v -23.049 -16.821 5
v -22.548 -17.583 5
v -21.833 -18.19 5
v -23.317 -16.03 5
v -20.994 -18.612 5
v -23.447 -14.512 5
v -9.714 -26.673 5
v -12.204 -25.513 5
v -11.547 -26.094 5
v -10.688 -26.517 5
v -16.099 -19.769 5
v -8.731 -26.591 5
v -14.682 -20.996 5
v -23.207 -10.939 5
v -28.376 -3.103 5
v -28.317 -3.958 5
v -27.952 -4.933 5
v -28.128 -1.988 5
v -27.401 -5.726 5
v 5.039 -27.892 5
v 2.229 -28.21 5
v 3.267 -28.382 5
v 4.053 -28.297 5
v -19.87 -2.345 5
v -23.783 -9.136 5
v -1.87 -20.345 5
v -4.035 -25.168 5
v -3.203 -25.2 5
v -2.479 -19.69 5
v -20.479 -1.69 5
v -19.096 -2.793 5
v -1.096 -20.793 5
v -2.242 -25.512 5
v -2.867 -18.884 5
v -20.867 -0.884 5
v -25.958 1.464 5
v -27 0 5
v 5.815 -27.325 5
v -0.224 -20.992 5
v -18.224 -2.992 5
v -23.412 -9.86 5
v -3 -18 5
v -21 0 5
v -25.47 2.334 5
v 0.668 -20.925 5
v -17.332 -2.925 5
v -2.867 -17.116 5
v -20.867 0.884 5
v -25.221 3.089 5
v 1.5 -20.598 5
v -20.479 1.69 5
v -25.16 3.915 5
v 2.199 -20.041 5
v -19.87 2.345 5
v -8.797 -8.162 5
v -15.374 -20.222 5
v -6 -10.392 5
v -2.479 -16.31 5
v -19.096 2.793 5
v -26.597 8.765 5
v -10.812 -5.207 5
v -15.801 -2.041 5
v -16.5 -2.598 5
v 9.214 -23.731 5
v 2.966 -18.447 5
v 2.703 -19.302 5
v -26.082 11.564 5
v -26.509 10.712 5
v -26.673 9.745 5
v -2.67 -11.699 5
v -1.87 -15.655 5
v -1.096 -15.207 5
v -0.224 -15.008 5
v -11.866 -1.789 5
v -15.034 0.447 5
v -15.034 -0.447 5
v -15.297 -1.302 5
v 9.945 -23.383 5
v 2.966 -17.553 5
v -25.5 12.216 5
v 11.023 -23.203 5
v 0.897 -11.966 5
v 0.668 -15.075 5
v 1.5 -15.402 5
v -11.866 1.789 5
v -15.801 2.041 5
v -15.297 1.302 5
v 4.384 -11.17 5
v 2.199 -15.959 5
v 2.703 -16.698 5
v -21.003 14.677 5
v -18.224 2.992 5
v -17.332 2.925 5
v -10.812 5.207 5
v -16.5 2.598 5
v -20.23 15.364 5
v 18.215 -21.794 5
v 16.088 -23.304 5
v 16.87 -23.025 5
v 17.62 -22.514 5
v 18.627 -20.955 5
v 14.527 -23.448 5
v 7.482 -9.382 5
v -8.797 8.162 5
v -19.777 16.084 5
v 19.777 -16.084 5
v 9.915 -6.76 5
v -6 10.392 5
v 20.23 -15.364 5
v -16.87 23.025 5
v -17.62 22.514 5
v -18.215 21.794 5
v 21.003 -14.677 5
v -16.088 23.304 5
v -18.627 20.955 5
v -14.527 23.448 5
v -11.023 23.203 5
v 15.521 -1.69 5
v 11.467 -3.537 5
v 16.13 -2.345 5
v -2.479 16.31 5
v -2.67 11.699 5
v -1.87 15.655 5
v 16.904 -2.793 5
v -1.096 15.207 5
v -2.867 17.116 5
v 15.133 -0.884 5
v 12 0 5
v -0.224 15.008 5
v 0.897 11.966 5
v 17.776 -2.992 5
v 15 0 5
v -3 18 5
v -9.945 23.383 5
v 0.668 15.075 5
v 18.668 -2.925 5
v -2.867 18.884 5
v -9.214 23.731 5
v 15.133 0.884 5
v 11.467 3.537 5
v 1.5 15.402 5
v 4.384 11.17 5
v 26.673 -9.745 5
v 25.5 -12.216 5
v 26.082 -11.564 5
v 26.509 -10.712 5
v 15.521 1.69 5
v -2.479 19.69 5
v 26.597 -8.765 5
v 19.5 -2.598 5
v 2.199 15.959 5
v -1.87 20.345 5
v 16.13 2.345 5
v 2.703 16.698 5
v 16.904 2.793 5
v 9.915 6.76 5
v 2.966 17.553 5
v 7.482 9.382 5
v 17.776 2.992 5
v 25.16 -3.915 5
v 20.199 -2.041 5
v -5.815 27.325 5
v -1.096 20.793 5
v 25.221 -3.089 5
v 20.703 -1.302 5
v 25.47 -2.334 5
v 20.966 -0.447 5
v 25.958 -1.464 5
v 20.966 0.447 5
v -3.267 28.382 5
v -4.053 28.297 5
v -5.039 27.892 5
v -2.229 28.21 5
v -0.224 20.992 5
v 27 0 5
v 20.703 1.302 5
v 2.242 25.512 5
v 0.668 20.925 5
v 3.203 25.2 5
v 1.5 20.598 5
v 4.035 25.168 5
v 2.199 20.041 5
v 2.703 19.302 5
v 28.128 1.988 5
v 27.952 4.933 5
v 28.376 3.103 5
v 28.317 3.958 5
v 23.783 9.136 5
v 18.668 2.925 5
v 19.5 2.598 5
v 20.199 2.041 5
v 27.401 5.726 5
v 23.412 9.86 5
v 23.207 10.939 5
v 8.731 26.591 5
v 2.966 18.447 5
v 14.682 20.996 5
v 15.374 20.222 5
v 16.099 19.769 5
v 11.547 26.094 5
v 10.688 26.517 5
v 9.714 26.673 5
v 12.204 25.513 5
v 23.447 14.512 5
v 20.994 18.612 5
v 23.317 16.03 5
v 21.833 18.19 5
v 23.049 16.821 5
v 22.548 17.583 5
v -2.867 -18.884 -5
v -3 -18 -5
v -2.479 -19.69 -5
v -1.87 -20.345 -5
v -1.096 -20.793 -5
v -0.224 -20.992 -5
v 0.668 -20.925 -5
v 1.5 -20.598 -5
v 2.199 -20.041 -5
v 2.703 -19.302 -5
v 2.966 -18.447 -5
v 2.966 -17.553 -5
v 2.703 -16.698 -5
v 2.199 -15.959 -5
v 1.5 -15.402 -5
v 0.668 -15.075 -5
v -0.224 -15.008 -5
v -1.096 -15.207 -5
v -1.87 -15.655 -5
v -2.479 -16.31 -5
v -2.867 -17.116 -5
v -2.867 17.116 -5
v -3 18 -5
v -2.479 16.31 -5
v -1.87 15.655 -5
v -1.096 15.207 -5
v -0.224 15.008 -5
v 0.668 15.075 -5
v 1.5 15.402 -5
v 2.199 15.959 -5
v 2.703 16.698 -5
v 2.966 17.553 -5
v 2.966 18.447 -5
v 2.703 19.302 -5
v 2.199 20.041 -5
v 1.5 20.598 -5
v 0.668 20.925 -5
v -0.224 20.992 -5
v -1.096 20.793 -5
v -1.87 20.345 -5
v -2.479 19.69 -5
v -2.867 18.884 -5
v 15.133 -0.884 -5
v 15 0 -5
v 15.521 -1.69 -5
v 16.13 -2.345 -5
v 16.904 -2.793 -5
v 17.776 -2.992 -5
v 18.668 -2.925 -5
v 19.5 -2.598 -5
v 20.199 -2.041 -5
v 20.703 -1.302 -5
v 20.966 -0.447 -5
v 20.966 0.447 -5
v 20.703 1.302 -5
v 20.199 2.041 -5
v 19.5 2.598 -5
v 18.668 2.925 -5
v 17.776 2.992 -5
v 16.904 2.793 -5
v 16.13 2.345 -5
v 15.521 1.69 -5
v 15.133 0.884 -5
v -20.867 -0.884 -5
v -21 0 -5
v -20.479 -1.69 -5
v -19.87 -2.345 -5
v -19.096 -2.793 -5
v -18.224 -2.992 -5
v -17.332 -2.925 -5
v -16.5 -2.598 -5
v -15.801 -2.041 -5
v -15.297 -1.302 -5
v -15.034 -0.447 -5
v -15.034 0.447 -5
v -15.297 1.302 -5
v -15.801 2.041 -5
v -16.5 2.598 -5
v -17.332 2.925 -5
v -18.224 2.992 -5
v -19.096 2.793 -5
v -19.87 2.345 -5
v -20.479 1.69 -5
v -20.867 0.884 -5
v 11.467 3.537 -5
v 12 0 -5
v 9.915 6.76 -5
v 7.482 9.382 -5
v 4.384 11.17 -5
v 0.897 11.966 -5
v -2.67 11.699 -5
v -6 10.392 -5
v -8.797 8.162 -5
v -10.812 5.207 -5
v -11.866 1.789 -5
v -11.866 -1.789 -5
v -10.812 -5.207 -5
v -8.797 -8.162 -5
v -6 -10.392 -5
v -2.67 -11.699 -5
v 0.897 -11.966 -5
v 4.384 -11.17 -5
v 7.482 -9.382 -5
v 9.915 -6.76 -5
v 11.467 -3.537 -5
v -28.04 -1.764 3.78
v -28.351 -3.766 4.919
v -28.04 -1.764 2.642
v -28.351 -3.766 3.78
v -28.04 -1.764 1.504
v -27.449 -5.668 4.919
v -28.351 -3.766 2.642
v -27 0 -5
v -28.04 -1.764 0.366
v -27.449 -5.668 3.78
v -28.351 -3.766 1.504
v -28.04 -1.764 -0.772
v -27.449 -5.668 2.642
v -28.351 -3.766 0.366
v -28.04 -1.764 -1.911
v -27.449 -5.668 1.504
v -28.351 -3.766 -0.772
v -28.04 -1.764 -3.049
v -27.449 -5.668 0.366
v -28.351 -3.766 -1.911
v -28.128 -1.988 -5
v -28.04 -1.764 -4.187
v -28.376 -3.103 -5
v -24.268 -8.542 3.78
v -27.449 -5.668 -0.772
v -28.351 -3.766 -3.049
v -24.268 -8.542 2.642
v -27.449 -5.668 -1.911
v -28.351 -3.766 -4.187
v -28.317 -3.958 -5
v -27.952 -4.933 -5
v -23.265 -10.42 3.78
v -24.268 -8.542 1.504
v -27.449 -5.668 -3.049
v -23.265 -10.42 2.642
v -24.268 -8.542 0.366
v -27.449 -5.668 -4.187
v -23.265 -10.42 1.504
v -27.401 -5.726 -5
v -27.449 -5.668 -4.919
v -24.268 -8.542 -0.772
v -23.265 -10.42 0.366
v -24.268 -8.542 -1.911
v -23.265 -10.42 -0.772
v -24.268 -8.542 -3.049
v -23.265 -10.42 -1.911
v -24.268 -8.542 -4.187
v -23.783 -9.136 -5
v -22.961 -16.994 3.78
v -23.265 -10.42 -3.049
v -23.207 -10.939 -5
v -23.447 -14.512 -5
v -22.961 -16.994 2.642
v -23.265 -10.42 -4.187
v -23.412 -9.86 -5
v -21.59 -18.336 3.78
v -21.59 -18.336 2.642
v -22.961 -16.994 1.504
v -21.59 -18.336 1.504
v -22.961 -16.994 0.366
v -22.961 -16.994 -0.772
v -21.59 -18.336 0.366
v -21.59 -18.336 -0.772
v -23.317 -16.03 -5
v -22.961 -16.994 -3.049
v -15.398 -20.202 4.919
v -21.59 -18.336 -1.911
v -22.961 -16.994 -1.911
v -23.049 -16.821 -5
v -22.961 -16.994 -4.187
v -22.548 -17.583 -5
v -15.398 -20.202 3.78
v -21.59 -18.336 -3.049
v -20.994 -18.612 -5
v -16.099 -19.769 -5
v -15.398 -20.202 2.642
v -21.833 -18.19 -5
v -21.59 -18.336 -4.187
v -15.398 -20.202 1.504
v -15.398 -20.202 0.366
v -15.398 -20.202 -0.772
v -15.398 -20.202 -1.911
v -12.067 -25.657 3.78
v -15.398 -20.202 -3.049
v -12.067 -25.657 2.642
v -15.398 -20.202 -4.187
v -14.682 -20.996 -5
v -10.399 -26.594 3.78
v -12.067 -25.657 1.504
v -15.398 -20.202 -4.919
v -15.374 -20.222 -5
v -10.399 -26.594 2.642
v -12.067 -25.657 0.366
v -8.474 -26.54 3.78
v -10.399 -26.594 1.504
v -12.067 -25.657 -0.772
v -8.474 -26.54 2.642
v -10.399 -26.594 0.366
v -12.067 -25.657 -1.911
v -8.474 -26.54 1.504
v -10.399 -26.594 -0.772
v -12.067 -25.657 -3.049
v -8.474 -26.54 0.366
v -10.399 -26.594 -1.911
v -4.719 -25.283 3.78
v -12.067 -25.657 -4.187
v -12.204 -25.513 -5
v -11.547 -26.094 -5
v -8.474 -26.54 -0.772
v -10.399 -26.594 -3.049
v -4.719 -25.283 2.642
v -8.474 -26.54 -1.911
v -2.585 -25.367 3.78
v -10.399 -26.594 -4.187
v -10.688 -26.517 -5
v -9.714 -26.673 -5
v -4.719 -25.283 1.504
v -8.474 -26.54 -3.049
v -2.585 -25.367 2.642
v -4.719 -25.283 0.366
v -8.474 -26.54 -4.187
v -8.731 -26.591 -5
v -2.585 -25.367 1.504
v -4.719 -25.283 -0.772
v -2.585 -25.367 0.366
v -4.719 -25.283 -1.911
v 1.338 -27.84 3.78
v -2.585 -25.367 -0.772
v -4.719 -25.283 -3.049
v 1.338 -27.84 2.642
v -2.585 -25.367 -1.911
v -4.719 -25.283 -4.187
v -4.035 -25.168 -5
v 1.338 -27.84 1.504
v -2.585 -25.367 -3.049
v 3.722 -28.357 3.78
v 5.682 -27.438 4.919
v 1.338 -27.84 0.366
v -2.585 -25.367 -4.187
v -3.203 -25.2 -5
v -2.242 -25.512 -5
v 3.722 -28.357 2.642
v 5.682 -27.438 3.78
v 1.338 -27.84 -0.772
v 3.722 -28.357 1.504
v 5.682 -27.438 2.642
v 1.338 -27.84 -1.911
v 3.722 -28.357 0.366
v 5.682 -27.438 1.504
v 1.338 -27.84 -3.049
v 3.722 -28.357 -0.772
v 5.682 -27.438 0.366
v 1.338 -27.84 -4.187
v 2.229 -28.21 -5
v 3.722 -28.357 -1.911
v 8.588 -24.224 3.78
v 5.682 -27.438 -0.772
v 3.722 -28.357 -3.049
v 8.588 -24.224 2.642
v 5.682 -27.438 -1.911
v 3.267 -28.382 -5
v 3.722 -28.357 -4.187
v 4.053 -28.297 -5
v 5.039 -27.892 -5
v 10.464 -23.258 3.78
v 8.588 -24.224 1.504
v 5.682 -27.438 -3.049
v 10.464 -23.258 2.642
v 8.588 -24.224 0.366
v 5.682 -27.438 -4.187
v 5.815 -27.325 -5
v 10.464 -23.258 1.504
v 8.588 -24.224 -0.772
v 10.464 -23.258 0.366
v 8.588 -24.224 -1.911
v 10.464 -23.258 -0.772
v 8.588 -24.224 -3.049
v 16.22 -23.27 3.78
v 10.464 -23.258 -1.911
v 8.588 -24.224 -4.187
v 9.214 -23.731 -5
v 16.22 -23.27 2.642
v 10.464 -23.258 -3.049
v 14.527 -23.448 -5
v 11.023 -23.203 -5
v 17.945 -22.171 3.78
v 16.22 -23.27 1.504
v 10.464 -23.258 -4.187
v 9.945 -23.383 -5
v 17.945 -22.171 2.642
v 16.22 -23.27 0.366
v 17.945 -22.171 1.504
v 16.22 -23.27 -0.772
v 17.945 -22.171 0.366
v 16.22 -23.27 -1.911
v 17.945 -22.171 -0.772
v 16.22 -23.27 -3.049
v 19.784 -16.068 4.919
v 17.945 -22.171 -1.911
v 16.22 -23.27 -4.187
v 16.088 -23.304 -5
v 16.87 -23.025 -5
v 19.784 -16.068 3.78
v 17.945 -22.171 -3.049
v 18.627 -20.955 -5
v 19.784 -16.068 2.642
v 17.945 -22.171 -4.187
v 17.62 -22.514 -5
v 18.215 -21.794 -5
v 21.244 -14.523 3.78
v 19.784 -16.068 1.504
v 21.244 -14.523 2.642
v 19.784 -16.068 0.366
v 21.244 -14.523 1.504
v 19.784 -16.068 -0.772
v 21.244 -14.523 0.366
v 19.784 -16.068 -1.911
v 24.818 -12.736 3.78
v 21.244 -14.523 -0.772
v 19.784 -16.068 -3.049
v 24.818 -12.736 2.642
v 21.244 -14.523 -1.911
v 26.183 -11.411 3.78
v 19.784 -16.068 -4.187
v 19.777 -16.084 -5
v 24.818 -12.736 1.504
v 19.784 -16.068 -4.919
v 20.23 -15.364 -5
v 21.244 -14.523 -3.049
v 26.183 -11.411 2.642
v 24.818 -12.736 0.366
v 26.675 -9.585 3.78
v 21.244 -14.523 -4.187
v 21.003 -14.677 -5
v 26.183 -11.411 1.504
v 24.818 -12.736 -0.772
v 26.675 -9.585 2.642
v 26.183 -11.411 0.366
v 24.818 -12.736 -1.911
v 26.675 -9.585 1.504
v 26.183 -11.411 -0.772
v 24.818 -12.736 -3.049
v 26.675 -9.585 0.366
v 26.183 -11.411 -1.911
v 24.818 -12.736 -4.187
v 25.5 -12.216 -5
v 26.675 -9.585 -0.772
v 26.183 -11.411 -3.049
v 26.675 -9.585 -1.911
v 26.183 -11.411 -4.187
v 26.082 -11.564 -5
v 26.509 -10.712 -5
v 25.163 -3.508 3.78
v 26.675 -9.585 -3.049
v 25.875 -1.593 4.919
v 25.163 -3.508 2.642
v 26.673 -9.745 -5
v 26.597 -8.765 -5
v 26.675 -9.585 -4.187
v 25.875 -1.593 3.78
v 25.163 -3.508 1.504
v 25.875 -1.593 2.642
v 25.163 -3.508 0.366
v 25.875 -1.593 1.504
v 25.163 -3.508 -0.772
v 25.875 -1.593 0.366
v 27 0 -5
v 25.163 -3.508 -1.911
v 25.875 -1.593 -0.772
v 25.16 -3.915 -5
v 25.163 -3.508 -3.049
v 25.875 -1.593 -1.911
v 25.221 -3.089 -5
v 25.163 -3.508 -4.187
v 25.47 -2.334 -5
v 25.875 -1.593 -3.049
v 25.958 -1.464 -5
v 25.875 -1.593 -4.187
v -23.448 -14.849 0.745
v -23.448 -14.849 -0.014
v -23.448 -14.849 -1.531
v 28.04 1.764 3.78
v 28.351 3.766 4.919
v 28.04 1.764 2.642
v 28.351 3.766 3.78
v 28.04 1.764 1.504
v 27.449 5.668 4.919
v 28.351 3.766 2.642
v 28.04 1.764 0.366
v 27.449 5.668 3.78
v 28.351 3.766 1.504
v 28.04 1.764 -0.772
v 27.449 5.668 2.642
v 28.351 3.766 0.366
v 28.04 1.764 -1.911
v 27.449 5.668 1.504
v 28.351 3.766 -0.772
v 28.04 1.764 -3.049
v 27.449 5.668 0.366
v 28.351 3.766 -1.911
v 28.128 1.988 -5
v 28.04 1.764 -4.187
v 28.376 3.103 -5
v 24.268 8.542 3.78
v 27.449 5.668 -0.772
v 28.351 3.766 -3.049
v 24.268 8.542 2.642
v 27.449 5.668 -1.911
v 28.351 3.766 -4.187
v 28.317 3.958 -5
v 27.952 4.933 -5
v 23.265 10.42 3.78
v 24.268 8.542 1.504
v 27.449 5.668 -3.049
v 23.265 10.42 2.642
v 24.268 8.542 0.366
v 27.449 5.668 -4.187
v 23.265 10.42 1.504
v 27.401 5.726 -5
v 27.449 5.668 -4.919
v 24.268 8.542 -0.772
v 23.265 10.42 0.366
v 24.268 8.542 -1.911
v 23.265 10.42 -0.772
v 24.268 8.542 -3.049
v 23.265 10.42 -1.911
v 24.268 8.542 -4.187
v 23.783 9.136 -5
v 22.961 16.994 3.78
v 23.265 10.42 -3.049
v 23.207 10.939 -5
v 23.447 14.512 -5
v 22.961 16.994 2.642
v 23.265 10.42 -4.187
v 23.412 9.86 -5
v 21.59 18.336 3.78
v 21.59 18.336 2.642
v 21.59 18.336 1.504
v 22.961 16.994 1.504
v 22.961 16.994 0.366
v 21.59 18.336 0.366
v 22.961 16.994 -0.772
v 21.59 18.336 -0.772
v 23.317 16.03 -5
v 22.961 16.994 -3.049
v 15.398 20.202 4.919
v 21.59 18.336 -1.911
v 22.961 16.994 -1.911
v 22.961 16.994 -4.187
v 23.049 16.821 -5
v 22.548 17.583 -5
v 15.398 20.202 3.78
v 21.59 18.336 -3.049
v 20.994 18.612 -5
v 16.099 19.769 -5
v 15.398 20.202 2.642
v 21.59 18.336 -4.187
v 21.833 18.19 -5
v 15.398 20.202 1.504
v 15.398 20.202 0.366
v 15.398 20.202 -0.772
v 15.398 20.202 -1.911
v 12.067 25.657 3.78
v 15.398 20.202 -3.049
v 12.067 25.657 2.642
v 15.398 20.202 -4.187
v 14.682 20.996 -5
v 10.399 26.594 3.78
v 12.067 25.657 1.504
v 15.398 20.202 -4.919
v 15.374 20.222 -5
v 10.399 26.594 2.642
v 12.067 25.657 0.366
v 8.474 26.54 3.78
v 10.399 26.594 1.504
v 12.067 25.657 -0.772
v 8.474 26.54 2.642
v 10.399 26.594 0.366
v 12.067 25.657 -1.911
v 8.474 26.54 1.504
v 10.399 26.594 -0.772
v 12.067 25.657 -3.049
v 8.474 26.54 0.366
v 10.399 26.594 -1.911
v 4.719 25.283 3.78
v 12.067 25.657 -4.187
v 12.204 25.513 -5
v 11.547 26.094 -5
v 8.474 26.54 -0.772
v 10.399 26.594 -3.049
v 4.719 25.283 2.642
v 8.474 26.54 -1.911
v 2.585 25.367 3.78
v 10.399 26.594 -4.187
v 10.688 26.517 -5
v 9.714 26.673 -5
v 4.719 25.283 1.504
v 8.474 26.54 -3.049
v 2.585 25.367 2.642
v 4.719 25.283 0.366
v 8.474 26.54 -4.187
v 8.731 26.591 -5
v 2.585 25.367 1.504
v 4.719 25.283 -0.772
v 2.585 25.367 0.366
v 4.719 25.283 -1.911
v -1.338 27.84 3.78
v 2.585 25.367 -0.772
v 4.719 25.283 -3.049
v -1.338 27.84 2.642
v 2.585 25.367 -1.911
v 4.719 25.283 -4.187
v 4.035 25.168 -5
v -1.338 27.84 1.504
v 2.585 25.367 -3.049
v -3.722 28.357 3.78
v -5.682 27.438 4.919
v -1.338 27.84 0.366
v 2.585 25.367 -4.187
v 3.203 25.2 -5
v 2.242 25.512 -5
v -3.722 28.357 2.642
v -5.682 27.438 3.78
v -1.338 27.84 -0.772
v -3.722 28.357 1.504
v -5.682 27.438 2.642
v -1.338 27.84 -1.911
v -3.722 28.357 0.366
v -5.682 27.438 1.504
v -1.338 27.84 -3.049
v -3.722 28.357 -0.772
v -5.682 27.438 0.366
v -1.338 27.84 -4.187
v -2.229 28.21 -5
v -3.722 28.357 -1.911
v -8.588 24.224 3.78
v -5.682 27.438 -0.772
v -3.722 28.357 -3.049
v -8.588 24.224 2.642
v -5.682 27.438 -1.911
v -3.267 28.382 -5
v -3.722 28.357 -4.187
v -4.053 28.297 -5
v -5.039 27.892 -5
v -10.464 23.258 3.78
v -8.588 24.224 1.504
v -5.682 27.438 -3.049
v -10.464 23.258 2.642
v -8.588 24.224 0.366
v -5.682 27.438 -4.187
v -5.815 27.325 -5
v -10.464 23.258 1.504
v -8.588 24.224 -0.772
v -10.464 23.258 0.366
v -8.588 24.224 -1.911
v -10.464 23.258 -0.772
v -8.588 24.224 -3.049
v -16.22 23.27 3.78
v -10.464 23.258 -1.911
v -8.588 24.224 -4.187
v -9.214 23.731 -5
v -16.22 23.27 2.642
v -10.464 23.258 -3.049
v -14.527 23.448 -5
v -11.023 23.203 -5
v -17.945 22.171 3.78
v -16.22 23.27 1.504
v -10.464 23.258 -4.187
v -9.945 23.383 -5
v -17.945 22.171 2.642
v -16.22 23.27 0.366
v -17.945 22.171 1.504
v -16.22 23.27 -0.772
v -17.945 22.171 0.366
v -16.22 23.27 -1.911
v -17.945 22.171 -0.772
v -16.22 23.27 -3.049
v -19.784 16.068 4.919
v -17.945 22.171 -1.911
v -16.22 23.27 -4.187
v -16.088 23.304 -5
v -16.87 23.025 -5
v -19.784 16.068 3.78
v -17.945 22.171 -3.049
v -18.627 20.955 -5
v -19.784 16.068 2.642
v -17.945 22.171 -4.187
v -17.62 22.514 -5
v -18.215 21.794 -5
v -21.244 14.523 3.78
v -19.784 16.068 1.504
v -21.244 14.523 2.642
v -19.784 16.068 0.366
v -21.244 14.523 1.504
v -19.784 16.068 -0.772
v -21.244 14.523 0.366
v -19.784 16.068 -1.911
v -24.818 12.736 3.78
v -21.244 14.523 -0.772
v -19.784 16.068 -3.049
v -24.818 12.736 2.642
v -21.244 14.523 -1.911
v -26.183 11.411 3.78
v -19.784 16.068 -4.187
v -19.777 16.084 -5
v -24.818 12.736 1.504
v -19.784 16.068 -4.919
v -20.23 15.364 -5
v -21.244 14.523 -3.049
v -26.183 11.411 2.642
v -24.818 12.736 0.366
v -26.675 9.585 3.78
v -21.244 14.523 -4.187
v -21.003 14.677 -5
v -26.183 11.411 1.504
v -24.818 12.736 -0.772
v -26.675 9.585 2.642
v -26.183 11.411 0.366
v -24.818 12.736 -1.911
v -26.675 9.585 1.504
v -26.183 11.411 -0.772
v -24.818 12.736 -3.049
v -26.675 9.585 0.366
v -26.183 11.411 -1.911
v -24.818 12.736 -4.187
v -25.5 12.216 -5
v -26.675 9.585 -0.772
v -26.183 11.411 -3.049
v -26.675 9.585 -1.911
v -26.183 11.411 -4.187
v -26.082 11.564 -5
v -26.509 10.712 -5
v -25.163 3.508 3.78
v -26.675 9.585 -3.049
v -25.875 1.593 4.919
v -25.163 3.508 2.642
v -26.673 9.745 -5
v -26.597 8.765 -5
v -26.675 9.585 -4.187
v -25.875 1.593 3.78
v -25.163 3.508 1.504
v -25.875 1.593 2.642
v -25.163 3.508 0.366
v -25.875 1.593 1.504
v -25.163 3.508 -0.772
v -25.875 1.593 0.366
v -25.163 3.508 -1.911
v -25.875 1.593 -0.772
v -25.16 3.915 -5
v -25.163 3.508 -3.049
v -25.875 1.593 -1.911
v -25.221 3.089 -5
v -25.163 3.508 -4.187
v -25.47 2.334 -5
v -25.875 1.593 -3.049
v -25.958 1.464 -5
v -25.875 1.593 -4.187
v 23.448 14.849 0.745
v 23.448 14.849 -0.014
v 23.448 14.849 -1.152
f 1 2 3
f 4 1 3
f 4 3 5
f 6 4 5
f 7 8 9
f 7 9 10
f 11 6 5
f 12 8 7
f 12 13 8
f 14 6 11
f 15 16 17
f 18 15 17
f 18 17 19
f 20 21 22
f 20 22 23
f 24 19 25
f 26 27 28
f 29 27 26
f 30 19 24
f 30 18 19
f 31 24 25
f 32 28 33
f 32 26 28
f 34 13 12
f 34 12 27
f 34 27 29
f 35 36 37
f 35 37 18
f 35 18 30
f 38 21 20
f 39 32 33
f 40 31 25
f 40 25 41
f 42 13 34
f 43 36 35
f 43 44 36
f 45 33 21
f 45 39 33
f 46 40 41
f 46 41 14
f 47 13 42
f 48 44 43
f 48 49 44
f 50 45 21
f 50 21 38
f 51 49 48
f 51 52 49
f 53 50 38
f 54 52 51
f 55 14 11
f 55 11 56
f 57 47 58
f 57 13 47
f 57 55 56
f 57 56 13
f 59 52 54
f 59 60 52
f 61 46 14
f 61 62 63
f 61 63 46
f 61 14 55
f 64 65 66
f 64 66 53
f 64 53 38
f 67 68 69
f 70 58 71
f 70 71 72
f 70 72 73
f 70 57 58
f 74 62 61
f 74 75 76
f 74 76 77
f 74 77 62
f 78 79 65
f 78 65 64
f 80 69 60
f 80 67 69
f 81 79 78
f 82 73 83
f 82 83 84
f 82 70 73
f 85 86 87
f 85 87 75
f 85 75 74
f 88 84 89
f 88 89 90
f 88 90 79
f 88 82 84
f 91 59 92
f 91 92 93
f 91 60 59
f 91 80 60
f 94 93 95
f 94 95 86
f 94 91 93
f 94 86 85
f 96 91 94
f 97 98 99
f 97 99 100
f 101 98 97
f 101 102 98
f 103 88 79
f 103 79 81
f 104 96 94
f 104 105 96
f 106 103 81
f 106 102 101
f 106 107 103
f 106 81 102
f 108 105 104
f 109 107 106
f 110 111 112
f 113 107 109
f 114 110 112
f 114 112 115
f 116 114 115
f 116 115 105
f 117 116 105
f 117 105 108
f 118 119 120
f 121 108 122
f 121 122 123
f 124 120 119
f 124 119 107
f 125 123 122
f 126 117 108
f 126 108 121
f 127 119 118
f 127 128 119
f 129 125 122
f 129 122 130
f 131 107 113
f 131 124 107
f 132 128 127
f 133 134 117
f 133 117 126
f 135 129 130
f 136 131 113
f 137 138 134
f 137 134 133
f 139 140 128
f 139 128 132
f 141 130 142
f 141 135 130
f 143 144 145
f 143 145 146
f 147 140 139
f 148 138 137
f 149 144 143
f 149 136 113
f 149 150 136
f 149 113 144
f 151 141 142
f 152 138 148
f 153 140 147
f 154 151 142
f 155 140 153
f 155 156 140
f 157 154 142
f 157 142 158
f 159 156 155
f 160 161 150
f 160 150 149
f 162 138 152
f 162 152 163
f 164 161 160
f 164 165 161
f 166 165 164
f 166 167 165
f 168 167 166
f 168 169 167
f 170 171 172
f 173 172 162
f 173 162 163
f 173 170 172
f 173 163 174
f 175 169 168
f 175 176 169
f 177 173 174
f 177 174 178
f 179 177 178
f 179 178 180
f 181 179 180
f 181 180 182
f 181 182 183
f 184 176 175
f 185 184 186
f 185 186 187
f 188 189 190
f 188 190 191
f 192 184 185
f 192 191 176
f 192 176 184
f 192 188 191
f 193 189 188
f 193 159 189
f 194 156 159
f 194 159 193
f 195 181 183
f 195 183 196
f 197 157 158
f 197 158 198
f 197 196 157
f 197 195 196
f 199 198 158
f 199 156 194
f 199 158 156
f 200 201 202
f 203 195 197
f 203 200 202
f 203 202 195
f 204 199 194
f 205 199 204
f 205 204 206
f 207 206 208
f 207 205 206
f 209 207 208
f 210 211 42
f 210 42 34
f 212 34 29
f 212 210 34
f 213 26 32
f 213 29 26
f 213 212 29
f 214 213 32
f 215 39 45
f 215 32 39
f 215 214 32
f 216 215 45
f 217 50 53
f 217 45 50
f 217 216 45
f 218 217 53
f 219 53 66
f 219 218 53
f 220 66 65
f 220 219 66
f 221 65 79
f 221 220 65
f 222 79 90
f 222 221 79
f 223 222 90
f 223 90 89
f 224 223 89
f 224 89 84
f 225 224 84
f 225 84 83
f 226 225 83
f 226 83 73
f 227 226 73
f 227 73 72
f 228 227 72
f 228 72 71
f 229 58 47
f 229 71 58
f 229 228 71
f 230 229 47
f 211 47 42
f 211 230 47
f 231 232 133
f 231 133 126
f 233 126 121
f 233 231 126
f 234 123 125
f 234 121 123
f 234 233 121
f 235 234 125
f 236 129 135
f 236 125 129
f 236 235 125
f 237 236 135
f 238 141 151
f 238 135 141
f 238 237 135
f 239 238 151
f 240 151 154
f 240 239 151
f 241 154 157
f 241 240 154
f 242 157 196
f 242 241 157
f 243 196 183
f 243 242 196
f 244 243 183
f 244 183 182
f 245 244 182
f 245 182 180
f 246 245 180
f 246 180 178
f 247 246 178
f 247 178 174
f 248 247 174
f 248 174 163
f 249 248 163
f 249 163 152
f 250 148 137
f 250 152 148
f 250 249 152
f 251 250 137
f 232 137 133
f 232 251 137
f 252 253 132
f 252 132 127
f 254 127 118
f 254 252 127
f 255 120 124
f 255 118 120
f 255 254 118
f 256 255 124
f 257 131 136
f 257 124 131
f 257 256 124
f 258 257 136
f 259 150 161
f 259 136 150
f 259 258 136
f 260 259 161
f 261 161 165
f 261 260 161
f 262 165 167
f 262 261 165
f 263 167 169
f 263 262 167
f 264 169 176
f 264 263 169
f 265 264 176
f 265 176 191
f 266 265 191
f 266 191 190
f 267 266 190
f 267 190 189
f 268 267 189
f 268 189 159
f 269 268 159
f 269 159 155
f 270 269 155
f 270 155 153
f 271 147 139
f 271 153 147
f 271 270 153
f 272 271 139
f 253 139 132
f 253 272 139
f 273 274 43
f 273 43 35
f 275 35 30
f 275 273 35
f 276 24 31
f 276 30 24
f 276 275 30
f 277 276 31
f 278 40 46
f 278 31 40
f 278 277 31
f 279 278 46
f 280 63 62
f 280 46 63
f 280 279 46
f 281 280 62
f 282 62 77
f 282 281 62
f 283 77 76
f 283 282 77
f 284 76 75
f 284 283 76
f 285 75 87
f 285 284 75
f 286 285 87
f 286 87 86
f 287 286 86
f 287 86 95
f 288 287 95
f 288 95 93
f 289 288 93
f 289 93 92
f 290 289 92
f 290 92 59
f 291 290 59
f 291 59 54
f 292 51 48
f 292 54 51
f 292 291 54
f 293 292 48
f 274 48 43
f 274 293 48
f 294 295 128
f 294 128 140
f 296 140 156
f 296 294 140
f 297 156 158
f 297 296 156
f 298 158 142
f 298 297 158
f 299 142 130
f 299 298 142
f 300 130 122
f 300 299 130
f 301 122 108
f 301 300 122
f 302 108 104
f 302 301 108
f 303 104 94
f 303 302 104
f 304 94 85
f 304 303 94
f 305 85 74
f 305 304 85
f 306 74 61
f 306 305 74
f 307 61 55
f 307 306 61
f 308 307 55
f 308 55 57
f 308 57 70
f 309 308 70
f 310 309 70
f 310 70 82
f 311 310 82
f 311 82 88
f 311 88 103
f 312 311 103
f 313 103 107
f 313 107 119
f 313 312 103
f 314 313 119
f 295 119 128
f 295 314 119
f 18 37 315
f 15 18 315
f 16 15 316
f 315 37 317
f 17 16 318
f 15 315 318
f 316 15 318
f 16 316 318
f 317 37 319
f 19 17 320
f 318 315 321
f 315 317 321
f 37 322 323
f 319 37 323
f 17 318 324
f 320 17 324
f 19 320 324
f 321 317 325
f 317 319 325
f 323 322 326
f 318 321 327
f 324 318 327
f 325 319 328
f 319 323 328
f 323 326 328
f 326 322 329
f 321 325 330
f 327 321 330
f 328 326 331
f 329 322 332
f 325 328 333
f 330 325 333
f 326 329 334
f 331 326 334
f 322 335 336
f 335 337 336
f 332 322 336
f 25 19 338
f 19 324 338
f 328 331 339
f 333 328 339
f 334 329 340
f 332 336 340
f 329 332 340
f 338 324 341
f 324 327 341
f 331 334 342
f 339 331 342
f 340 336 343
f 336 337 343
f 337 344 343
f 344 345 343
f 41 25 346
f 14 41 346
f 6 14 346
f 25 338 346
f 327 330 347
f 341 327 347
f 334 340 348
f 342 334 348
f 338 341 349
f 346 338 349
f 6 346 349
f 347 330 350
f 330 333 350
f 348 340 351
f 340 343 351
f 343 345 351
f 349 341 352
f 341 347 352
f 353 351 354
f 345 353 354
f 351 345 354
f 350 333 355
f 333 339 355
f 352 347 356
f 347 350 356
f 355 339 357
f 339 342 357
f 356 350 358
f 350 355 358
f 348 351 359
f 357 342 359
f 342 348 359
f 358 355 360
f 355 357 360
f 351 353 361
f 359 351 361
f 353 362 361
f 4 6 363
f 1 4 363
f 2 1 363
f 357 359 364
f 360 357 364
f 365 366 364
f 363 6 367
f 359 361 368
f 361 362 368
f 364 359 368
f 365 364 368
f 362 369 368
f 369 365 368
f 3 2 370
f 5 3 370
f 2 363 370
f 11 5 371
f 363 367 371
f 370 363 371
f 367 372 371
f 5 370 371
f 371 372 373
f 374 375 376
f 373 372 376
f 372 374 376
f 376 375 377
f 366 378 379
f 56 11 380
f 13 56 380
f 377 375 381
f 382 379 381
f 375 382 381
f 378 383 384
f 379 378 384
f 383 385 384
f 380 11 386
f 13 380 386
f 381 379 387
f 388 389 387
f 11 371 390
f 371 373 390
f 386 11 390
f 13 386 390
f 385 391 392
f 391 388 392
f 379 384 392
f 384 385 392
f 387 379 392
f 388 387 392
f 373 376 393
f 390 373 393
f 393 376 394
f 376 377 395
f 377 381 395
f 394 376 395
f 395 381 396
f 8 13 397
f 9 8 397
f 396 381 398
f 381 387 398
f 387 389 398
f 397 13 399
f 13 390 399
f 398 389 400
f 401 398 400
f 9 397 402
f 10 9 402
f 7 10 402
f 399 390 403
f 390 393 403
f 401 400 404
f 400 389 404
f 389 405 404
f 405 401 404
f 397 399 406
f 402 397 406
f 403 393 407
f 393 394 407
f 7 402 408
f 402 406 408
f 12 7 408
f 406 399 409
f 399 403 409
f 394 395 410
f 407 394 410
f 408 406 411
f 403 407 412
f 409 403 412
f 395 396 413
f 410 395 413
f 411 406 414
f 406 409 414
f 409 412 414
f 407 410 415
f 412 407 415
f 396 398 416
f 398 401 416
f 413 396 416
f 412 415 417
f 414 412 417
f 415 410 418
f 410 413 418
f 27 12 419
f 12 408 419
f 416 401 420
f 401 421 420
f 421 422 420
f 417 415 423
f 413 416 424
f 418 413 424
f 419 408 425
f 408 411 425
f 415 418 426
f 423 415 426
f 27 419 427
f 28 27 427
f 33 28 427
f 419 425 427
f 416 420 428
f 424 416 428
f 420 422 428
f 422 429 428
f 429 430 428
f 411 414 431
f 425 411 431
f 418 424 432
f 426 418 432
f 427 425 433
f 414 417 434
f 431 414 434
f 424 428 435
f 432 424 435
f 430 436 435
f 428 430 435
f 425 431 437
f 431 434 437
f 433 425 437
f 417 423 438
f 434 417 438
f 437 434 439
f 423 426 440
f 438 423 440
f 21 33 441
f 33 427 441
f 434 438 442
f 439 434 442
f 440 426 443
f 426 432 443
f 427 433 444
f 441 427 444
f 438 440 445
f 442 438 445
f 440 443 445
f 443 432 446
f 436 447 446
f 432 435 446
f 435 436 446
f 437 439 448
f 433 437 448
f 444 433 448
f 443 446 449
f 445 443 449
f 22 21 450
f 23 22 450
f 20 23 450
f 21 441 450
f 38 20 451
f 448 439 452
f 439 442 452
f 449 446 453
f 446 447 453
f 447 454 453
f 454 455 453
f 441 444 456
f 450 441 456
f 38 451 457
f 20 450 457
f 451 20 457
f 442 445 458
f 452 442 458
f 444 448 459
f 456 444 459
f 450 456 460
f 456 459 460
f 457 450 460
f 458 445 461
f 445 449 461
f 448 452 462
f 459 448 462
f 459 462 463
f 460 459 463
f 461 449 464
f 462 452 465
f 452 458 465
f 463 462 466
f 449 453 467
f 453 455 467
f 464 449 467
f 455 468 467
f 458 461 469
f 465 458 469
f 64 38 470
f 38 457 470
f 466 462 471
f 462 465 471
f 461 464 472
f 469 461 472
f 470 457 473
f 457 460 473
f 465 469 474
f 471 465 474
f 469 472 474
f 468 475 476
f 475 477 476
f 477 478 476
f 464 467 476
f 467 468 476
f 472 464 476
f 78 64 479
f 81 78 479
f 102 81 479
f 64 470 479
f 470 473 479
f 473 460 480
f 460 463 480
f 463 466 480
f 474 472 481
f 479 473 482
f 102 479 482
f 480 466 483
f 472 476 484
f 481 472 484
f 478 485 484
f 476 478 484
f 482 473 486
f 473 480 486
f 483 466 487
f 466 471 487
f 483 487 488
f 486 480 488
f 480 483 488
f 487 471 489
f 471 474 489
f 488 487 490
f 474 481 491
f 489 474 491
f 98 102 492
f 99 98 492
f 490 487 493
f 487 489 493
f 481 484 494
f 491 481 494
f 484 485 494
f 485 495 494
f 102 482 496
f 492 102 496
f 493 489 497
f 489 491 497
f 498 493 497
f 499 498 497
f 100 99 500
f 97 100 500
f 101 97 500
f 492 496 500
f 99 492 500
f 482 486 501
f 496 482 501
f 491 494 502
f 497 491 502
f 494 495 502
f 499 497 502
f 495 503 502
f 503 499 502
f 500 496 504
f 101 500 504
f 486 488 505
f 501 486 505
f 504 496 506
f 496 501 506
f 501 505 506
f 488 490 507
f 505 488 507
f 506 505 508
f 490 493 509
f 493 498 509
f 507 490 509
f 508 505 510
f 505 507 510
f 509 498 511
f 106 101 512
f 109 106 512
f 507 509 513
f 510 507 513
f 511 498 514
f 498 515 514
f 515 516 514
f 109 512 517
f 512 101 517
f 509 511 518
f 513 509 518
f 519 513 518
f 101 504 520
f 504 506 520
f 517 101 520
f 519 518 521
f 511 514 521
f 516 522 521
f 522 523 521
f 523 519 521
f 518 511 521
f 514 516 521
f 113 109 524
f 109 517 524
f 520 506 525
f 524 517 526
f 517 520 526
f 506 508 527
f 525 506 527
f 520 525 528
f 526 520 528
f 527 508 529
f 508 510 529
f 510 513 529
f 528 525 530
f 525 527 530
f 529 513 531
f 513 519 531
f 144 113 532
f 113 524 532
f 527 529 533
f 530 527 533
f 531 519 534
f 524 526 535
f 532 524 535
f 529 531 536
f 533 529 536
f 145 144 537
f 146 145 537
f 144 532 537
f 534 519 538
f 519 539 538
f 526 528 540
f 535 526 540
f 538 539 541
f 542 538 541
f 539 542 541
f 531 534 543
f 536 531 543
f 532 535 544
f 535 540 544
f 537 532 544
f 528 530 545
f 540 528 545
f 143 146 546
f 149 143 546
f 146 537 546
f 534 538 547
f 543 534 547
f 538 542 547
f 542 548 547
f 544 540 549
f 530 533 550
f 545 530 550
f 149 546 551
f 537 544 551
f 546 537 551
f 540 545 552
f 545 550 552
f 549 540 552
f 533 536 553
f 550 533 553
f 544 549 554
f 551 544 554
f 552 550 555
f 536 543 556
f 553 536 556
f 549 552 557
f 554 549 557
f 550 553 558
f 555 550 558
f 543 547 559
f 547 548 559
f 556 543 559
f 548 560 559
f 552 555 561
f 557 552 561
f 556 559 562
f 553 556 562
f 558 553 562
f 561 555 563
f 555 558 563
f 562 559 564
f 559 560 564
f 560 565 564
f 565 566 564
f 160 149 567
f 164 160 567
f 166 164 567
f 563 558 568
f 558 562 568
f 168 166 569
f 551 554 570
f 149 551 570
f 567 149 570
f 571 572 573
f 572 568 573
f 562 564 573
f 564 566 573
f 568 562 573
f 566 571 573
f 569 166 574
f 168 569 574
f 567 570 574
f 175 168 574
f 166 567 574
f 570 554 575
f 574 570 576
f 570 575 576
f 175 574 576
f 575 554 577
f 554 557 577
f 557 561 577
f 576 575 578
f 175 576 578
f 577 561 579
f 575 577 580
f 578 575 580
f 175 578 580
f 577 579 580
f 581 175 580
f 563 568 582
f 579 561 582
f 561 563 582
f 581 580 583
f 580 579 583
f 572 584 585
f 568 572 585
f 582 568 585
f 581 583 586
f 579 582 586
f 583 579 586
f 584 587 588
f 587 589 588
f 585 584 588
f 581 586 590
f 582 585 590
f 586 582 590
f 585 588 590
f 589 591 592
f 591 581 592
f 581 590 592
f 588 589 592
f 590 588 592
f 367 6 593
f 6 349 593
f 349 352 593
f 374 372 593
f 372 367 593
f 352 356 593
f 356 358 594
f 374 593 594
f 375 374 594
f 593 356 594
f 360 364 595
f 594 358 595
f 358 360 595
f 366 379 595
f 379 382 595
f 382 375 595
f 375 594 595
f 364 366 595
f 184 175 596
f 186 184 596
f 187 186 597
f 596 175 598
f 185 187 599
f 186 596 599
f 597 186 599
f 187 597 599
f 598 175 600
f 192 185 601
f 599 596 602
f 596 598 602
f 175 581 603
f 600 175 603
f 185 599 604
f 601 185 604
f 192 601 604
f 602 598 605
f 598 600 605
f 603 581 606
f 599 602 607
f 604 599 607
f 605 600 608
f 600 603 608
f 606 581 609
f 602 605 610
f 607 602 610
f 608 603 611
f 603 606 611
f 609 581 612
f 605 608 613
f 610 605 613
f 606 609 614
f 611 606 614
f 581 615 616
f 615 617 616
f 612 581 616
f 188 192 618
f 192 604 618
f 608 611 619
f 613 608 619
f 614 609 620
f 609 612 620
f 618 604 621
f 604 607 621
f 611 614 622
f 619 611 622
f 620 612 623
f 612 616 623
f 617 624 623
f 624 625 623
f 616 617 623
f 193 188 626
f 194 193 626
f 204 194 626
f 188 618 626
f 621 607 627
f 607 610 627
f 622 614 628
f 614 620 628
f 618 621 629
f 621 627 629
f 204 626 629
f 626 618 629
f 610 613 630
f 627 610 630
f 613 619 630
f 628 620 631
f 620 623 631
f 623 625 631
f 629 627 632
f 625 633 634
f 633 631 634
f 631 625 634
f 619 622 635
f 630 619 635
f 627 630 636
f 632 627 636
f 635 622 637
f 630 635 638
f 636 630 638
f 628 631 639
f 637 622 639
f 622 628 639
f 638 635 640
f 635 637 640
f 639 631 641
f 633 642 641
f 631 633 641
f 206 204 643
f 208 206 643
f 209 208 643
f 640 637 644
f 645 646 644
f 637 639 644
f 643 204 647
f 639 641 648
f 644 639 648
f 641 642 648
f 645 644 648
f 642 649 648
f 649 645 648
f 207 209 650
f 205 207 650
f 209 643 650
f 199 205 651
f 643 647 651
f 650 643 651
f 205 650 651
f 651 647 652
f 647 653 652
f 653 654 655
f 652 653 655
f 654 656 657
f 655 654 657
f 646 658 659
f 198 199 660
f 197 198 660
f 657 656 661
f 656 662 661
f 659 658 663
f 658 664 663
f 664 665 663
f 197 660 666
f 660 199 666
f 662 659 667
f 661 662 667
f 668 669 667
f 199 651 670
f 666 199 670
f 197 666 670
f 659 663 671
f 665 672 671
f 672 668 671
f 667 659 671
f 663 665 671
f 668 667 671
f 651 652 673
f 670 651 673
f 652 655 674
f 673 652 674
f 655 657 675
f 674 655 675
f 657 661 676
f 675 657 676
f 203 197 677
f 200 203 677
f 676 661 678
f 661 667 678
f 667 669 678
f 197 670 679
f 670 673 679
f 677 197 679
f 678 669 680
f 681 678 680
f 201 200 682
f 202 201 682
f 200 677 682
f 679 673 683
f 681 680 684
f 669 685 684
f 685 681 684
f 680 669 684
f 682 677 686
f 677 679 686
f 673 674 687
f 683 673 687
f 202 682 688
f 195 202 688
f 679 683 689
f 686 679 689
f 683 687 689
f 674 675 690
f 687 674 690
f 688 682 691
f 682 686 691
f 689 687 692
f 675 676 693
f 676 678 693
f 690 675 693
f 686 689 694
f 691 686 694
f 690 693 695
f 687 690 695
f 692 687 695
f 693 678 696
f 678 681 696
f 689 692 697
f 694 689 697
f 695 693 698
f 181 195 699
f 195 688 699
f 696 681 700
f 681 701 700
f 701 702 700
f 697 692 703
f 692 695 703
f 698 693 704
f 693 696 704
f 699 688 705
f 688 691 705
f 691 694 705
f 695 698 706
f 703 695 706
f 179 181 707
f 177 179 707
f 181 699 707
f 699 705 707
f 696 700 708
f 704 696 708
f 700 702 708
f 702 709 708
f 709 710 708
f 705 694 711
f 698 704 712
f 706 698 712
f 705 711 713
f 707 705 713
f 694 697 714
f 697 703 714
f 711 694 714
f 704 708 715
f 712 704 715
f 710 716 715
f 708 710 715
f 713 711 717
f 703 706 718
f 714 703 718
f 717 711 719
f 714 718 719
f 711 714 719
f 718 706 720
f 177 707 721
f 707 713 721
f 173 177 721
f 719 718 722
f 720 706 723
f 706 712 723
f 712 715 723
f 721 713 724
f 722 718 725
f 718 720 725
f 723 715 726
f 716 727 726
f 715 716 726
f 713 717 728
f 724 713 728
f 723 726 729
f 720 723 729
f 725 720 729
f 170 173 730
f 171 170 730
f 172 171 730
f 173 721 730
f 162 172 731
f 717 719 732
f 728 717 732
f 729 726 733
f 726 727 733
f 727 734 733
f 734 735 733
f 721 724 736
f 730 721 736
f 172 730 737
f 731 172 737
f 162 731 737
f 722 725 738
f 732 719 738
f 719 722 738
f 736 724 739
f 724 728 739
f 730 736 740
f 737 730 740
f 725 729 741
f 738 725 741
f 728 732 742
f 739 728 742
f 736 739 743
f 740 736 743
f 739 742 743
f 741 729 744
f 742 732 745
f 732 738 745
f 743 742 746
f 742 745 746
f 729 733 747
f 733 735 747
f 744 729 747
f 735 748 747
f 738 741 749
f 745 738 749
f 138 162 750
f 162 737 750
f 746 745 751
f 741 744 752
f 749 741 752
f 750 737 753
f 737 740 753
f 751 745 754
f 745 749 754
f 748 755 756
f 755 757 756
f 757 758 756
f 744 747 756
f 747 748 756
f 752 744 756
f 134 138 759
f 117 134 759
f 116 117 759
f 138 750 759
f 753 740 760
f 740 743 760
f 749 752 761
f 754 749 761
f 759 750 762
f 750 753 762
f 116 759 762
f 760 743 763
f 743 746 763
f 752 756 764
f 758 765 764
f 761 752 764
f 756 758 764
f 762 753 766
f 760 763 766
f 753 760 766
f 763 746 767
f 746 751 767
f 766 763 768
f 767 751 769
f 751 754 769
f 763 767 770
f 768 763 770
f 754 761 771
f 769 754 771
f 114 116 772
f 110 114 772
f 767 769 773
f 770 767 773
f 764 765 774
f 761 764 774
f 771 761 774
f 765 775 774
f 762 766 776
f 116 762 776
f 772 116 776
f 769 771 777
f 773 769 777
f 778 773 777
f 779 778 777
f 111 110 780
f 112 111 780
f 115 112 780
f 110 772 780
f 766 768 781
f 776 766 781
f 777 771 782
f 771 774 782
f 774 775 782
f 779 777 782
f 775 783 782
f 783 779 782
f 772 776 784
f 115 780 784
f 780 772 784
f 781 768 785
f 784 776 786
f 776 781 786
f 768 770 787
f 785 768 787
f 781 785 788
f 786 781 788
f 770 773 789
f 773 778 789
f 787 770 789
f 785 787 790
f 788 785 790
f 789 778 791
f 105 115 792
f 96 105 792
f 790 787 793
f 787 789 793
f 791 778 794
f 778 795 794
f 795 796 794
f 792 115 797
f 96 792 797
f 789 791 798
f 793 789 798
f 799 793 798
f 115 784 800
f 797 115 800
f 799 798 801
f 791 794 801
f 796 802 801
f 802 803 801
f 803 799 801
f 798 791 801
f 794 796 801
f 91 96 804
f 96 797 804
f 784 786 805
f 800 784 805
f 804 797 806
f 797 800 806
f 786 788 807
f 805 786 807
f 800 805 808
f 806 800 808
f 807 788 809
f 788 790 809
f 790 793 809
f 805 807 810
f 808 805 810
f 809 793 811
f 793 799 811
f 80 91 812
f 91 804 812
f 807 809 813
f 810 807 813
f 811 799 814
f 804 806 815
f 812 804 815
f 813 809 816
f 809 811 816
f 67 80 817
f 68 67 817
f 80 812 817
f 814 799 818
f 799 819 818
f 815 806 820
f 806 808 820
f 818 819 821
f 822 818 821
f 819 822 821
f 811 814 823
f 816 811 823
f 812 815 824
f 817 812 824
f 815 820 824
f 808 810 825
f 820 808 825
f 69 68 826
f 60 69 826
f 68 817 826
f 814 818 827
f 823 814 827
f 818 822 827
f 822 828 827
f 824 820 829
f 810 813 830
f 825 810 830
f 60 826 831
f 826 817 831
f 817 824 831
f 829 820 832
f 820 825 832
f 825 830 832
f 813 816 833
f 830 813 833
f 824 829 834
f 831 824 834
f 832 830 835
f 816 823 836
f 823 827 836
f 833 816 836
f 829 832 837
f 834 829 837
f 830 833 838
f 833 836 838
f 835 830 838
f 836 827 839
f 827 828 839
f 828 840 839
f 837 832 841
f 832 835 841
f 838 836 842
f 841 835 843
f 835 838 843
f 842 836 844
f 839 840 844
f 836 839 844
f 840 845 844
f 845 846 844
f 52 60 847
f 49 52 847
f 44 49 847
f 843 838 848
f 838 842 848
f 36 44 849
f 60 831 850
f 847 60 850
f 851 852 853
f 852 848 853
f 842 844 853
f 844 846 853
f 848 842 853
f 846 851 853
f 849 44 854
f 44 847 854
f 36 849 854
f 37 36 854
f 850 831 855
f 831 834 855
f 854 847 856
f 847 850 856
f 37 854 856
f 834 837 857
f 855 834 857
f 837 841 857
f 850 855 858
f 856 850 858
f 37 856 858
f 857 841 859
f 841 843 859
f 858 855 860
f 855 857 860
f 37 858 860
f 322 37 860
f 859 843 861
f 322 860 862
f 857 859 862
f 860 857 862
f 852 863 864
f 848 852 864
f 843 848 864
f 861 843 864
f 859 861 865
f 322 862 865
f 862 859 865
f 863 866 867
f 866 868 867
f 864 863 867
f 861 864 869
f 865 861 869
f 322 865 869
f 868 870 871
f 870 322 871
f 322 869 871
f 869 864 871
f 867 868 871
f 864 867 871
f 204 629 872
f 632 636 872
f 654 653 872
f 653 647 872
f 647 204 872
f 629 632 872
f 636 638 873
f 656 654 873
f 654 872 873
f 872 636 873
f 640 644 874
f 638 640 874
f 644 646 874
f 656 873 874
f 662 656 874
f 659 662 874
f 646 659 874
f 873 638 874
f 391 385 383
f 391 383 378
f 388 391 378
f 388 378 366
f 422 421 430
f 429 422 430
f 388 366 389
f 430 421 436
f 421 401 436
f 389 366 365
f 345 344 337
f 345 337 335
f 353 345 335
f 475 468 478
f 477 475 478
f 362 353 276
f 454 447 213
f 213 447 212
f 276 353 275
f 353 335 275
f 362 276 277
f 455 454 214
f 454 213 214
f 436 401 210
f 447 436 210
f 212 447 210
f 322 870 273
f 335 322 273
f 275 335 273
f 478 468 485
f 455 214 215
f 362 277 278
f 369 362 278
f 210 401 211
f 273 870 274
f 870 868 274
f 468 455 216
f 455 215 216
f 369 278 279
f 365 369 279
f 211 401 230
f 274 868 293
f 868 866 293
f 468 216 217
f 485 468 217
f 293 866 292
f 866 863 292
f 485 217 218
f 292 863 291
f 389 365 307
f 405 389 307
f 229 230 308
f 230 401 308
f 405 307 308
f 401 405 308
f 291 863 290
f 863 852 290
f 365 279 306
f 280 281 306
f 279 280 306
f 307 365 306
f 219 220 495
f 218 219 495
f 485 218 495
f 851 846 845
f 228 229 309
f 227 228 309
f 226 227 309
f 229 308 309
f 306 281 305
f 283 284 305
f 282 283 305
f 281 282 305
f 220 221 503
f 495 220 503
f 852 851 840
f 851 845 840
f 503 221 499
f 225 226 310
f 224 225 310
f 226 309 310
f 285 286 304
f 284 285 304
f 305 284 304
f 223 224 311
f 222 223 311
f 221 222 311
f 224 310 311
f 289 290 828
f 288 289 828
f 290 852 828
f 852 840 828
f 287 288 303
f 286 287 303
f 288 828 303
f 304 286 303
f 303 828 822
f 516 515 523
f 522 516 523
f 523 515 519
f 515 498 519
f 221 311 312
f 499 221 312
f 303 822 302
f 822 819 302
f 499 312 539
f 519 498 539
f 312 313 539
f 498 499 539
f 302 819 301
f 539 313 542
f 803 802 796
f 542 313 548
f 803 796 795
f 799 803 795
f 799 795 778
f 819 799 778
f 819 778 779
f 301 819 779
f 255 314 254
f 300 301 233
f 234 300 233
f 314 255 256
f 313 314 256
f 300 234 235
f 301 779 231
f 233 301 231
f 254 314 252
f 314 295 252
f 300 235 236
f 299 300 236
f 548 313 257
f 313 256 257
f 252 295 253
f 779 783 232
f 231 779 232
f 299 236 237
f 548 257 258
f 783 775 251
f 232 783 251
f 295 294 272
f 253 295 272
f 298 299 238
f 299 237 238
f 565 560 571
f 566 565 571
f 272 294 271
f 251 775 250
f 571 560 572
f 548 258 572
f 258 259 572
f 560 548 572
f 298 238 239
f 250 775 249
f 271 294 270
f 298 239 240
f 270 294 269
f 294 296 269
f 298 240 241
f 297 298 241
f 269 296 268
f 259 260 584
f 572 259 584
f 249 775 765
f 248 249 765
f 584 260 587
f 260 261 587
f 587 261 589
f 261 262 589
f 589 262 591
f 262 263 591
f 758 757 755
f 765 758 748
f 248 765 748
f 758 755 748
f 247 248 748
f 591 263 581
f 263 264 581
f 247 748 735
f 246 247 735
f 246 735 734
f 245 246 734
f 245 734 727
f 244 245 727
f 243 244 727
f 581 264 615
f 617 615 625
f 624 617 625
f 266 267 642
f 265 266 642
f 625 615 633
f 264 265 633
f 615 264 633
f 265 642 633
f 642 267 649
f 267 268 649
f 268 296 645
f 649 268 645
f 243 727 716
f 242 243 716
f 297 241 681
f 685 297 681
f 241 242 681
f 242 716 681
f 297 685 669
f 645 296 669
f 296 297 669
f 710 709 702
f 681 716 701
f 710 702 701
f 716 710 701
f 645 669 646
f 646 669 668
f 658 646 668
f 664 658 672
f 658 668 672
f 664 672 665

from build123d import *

# Parameters (mm, degrees)
EXTRUDE_1_DEPTH          = 5
EXTRUDE_1_DEPTH_BACK     = 5
SKETCH_1_R               = 12
CUT_EXTRUDE_1_DEPTH      = 10
CUT_EXTRUDE_1_DEPTH_BACK = 10
SKETCH_2_R               = 3


with BuildPart() as part:
    # 草图1 → 凸台-拉伸1 (new, two sides: drawn at the far end of the back side and taken through both)
    with BuildSketch(Plane.XY.offset(-EXTRUDE_1_DEPTH_BACK)):
        with BuildLine():
            add(Edge.make_bspline(
                [(27, 1e-09), (27.038329618, 0.053901025), (27.115014782, 0.162907478), (27.276476053, 0.396041545), (27.447701282, 0.656953046), (27.612122564, 0.923715907), (27.77013463, 1.200483311), (27.951855971, 1.552617031), (28.156734998, 2.023540025), (28.342276646, 2.627812976), (28.420849834, 3.358705174), (28.319548283, 4.107654001), (28.072581926, 4.750989723), (27.753990708, 5.285309302), (27.401982213, 5.739513757), (27.044235493, 6.127714964), (26.626247568, 6.526405154), (26.150499336, 6.935434499), (25.623024953, 7.3601277), (25.055495548, 7.814403897), (24.506772541, 8.286529313), (24.003302601, 8.803007081), (23.585873423, 9.392941702), (23.31187603, 10.062482961), (23.194598855, 10.780149453), (23.189869052, 11.510641827), (23.247468165, 12.241995777), (23.329842582, 12.97569032), (23.415594479, 13.785986393), (23.470538448, 14.679018115), (23.426737842, 15.734217744), (23.156884114, 16.767833322), (22.612560688, 17.599369689), (21.84335094, 18.230373336), (21.015845602, 18.643793933), (20.134208597, 18.901118206), (19.238533525, 19.073565794), (18.433162473, 19.196807948), (17.724607482, 19.306511945), (17.022949353, 19.443080766), (16.338569744, 19.642903655), (15.690252149, 19.951618164), (15.125636448, 20.402094584), (14.670490855, 20.972264674), (14.303151, 21.610758753), (13.987307124, 22.280495924), (13.689414504, 22.96442087), (13.357231745, 23.707422844), (12.957856931, 24.497578402), (12.388540605, 25.379111046), (11.639197645, 26.122667498), (10.756310084, 26.556041748), (9.790558951, 26.707272115), (8.902220986, 26.654715978), (8.035742526, 26.449390283), (7.191940868, 26.16259901), (6.437470652, 25.870092195), (5.760265662, 25.605997025), (5.077046925, 25.366696387), (4.378020568, 25.189003235), (3.658412294, 25.122419192), (2.941571057, 25.219929274), (2.261416852, 25.477179462), (1.626425783, 25.838341717), (1.021855057, 26.253892778), (0.427643673, 26.692083201), (-0.231217095, 27.171491874), (-0.977133422, 27.665592153), (-1.912863319, 28.155258624), (-2.942927586, 28.438366773), (-3.935220887, 28.382736741), (-4.866290965, 28.032083548), (-5.638076363, 27.52215309), (-6.301744232, 26.887295269), (-6.898925754, 26.197841641), (-7.408342119, 25.561990959), (-7.857626062, 25.003216317), (-8.326727195, 24.463846974), (-8.841968697, 23.971068285), (-9.433482102, 23.563966036), (-10.105913977, 23.300232704), (-10.827268555, 23.191150104), (-11.563890575, 23.192271496), (-12.301821917, 23.253611262), (-13.043064606, 23.337591158), (-13.852614567, 23.421413438), (-14.736596765, 23.470622482), (-15.784684584, 23.418346403), (-16.803294852, 23.14117459), (-17.620051727, 22.593258657), (-18.233896656, 21.832508827), (-18.632550642, 21.03690751), (-18.887972702, 20.183852311), (-19.061504835, 19.309702993), (-19.185421882, 18.510059229), (-19.295310774, 17.791534889), (-19.42968052, 17.080199839), (-19.625305718, 16.385978603), (-19.92744815, 15.729487649), (-20.370312213, 15.15743979), (-20.933179139, 14.697034361), (-21.563441944, 14.327696552), (-22.225620236, 14.011899447), (-22.902184704, 13.716390883), (-23.646836794, 13.385507739), (-24.447630912, 12.986570991), (-25.339663658, 12.421045424), (-26.094750311, 11.675439171), (-26.538761078, 10.802517772), (-26.703100421, 9.85694291), (-26.666365821, 8.988428209), (-26.477281436, 8.135521353), (-26.202732395, 7.301639297), (-25.914793282, 6.550792045), (-25.648201985, 5.870763507), (-25.401664383, 5.187163079), (-25.211021331, 4.488624078), (-25.124411004, 3.785352657), (-25.188594434, 3.093321998), (-25.394905104, 2.451828627), (-25.696169113, 1.863735812), (-26.044343878, 1.320885268), (-26.385099144, 0.844516455), (-26.65348463, 0.479919104), (-26.881869664, 0.164896492), (-26.960720302, 0.055237075), (-27, -1e-09)],
                knots=[0.08250356, 0.08250356, 0.08250356, 0.08250356, 0.08250356, 0.085297074, 0.088090587, 0.0908841, 0.093677614, 0.096471127, 0.099264641, 0.104851668, 0.111756318, 0.118660968, 0.124939935, 0.131218902, 0.135865943, 0.140512985, 0.145160026, 0.149807067, 0.15621266, 0.162618252, 0.169023845, 0.175429437, 0.181707775, 0.187986113, 0.194329471, 0.20067283, 0.207174601, 0.213676373, 0.220178144, 0.226679916, 0.235913781, 0.245147647, 0.257333433, 0.263760898, 0.270188364, 0.279939855, 0.289691347, 0.296009802, 0.302328257, 0.308646712, 0.314965167, 0.32118272, 0.327400274, 0.33378526, 0.340170246, 0.346739484, 0.353308723, 0.359877961, 0.3664472, 0.375446228, 0.384445256, 0.396798342, 0.403077309, 0.409356276, 0.418650358, 0.427944441, 0.434350033, 0.440755626, 0.447161218, 0.453566811, 0.459845149, 0.466123486, 0.472466845, 0.478810203, 0.485311975, 0.491813746, 0.498315518, 0.504817289, 0.514051155, 0.52328502, 0.535470807, 0.541898272, 0.548325738, 0.558077229, 0.567828721, 0.574147176, 0.580465631, 0.586784085, 0.59310254, 0.599320094, 0.605537647, 0.611922633, 0.61830762, 0.624876858, 0.631446097, 0.638015335, 0.644584573, 0.653583602, 0.66258263, 0.674935716, 0.681214682, 0.687493649, 0.696787732, 0.706081814, 0.712487407, 0.718893, 0.725298592, 0.731704185, 0.737982522, 0.74426086, 0.750604218, 0.756947577, 0.763449348, 0.76995112, 0.776452891, 0.782954663, 0.792188529, 0.801422394, 0.81360818, 0.819792934, 0.825977687, 0.835004875, 0.844032064, 0.850467934, 0.856903804, 0.863339674, 0.869775544, 0.876072127, 0.88236871, 0.888191169, 0.894013628, 0.899739141, 0.905464655, 0.911190168, 0.914052924, 0.916915681, 0.916915681, 0.916915681, 0.916915681, 0.916915681], degree=4))
            add(Edge.make_bspline(
                [(-27, -1e-09), (-27.038329618, -0.053901025), (-27.115014782, -0.162907478), (-27.276476053, -0.396041545), (-27.447701282, -0.656953046), (-27.612122564, -0.923715907), (-27.77013463, -1.200483311), (-27.951855971, -1.552617031), (-28.156734998, -2.023540025), (-28.342276646, -2.627812976), (-28.420849834, -3.358705174), (-28.319548283, -4.107654001), (-28.072581926, -4.750989723), (-27.753990708, -5.285309302), (-27.401982213, -5.739513757), (-27.044235493, -6.127714964), (-26.626247568, -6.526405154), (-26.150499336, -6.935434499), (-25.623024953, -7.3601277), (-25.055495548, -7.814403897), (-24.506772541, -8.286529313), (-24.003302601, -8.803007081), (-23.585873423, -9.392941702), (-23.31187603, -10.062482961), (-23.194598855, -10.780149453), (-23.189869052, -11.510641827), (-23.247468165, -12.241995777), (-23.329842582, -12.97569032), (-23.415594479, -13.785986393), (-23.470538448, -14.679018115), (-23.426737842, -15.734217744), (-23.156884114, -16.767833322), (-22.612560688, -17.599369689), (-21.84335094, -18.230373336), (-21.015845602, -18.643793933), (-20.134208597, -18.901118206), (-19.238533525, -19.073565794), (-18.433162473, -19.196807948), (-17.724607482, -19.306511945), (-17.022949353, -19.443080766), (-16.338569744, -19.642903655), (-15.690252149, -19.951618164), (-15.125636448, -20.402094584), (-14.670490855, -20.972264674), (-14.303151, -21.610758753), (-13.987307124, -22.280495924), (-13.689414504, -22.96442087), (-13.357231745, -23.707422844), (-12.957856931, -24.497578402), (-12.388540605, -25.379111046), (-11.639197645, -26.122667498), (-10.756310084, -26.556041748), (-9.790558951, -26.707272115), (-8.902220986, -26.654715978), (-8.035742526, -26.449390283), (-7.191940868, -26.16259901), (-6.437470652, -25.870092195), (-5.760265662, -25.605997025), (-5.077046925, -25.366696387), (-4.378020568, -25.189003235), (-3.658412294, -25.122419192), (-2.941571057, -25.219929274), (-2.261416852, -25.477179462), (-1.626425783, -25.838341717), (-1.021855057, -26.253892778), (-0.427643673, -26.692083201), (0.231217095, -27.171491874), (0.977133422, -27.665592153), (1.912863319, -28.155258624), (2.942927586, -28.438366773), (3.935220887, -28.382736741), (4.866290965, -28.032083548), (5.638076363, -27.52215309), (6.301744232, -26.887295269), (6.898925754, -26.197841641), (7.408342119, -25.561990959), (7.857626062, -25.003216317), (8.326727195, -24.463846974), (8.841968697, -23.971068285), (9.433482102, -23.563966036), (10.105913977, -23.300232704), (10.827268555, -23.191150104), (11.563890575, -23.192271496), (12.301821917, -23.253611262), (13.043064606, -23.337591158), (13.852614567, -23.421413438), (14.736596765, -23.470622482), (15.784684584, -23.418346403), (16.803294852, -23.14117459), (17.620051727, -22.593258657), (18.233896656, -21.832508827), (18.632550642, -21.03690751), (18.887972702, -20.183852311), (19.061504835, -19.309702993), (19.185421882, -18.510059229), (19.295310774, -17.791534889), (19.42968052, -17.080199839), (19.625305718, -16.385978603), (19.92744815, -15.729487649), (20.370312213, -15.15743979), (20.933179139, -14.697034361), (21.563441944, -14.327696552), (22.225620236, -14.011899447), (22.902184704, -13.716390883), (23.646836794, -13.385507739), (24.447630912, -12.986570991), (25.339663658, -12.421045424), (26.094750311, -11.675439171), (26.538761078, -10.802517772), (26.703100421, -9.85694291), (26.666365821, -8.988428209), (26.477281436, -8.135521353), (26.202732394, -7.301639297), (25.914793282, -6.550792045), (25.648201985, -5.870763507), (25.401664383, -5.187163079), (25.211021331, -4.488624078), (25.124411004, -3.785352657), (25.188594434, -3.093321998), (25.394905104, -2.451828627), (25.696169113, -1.863735812), (26.044343878, -1.320885268), (26.385099144, -0.844516455), (26.65348463, -0.479919104), (26.881869664, -0.164896493), (26.960720302, -0.055237076), (27, 1e-09)],
                knots=[0.08250356, 0.08250356, 0.08250356, 0.08250356, 0.08250356, 0.085297074, 0.088090587, 0.0908841, 0.093677614, 0.096471127, 0.099264641, 0.104851668, 0.111756318, 0.118660968, 0.124939935, 0.131218902, 0.135865943, 0.140512985, 0.145160026, 0.149807067, 0.15621266, 0.162618252, 0.169023845, 0.175429437, 0.181707775, 0.187986113, 0.194329471, 0.20067283, 0.207174601, 0.213676373, 0.220178144, 0.226679916, 0.235913781, 0.245147647, 0.257333433, 0.263760898, 0.270188364, 0.279939855, 0.289691347, 0.296009802, 0.302328257, 0.308646712, 0.314965167, 0.32118272, 0.327400274, 0.33378526, 0.340170246, 0.346739484, 0.353308723, 0.359877961, 0.3664472, 0.375446228, 0.384445256, 0.396798342, 0.403077309, 0.409356276, 0.418650358, 0.427944441, 0.434350033, 0.440755626, 0.447161218, 0.453566811, 0.459845149, 0.466123486, 0.472466845, 0.478810203, 0.485311975, 0.491813746, 0.498315518, 0.504817289, 0.514051155, 0.52328502, 0.535470807, 0.541898272, 0.548325738, 0.558077229, 0.567828721, 0.574147176, 0.580465631, 0.586784085, 0.59310254, 0.599320094, 0.605537647, 0.611922633, 0.61830762, 0.624876858, 0.631446097, 0.638015335, 0.644584573, 0.653583602, 0.66258263, 0.674935716, 0.681214682, 0.687493649, 0.696787732, 0.706081814, 0.712487407, 0.718893, 0.725298592, 0.731704185, 0.737982522, 0.74426086, 0.750604218, 0.756947577, 0.763449348, 0.76995112, 0.776452891, 0.782954663, 0.792188529, 0.801422394, 0.81360818, 0.819792934, 0.825977687, 0.835004875, 0.844032064, 0.850467934, 0.856903804, 0.863339674, 0.869775544, 0.876072127, 0.88236871, 0.888191169, 0.894013628, 0.899739141, 0.905464655, 0.911190168, 0.914052924, 0.916915681, 0.916915681, 0.916915681, 0.916915681, 0.916915681], degree=4))
        make_face()
        Circle(SKETCH_1_R, mode=Mode.SUBTRACT)
    extrude(amount=EXTRUDE_1_DEPTH + EXTRUDE_1_DEPTH_BACK)

    # 草图2 → 切除-拉伸1 (cut, two sides: drawn at the far end of the back side and taken through both)
    with BuildSketch(Plane.XY.offset(-CUT_EXTRUDE_1_DEPTH_BACK)):
        with Locations(Location((18, 0, 0), (0, 0, 180))):
            Circle(SKETCH_2_R)
        with Locations(Location((0, -18, 0), (0, 0, 180))):
            Circle(SKETCH_2_R)
        with Locations(Location((-18, 0, 0), (0, 0, 180))):
            Circle(SKETCH_2_R)
        with Locations(Location((0, 18, 0), (0, 0, 180))):
            Circle(SKETCH_2_R)
    extrude(amount=CUT_EXTRUDE_1_DEPTH + CUT_EXTRUDE_1_DEPTH_BACK, mode=Mode.SUBTRACT)


solid = part.part
